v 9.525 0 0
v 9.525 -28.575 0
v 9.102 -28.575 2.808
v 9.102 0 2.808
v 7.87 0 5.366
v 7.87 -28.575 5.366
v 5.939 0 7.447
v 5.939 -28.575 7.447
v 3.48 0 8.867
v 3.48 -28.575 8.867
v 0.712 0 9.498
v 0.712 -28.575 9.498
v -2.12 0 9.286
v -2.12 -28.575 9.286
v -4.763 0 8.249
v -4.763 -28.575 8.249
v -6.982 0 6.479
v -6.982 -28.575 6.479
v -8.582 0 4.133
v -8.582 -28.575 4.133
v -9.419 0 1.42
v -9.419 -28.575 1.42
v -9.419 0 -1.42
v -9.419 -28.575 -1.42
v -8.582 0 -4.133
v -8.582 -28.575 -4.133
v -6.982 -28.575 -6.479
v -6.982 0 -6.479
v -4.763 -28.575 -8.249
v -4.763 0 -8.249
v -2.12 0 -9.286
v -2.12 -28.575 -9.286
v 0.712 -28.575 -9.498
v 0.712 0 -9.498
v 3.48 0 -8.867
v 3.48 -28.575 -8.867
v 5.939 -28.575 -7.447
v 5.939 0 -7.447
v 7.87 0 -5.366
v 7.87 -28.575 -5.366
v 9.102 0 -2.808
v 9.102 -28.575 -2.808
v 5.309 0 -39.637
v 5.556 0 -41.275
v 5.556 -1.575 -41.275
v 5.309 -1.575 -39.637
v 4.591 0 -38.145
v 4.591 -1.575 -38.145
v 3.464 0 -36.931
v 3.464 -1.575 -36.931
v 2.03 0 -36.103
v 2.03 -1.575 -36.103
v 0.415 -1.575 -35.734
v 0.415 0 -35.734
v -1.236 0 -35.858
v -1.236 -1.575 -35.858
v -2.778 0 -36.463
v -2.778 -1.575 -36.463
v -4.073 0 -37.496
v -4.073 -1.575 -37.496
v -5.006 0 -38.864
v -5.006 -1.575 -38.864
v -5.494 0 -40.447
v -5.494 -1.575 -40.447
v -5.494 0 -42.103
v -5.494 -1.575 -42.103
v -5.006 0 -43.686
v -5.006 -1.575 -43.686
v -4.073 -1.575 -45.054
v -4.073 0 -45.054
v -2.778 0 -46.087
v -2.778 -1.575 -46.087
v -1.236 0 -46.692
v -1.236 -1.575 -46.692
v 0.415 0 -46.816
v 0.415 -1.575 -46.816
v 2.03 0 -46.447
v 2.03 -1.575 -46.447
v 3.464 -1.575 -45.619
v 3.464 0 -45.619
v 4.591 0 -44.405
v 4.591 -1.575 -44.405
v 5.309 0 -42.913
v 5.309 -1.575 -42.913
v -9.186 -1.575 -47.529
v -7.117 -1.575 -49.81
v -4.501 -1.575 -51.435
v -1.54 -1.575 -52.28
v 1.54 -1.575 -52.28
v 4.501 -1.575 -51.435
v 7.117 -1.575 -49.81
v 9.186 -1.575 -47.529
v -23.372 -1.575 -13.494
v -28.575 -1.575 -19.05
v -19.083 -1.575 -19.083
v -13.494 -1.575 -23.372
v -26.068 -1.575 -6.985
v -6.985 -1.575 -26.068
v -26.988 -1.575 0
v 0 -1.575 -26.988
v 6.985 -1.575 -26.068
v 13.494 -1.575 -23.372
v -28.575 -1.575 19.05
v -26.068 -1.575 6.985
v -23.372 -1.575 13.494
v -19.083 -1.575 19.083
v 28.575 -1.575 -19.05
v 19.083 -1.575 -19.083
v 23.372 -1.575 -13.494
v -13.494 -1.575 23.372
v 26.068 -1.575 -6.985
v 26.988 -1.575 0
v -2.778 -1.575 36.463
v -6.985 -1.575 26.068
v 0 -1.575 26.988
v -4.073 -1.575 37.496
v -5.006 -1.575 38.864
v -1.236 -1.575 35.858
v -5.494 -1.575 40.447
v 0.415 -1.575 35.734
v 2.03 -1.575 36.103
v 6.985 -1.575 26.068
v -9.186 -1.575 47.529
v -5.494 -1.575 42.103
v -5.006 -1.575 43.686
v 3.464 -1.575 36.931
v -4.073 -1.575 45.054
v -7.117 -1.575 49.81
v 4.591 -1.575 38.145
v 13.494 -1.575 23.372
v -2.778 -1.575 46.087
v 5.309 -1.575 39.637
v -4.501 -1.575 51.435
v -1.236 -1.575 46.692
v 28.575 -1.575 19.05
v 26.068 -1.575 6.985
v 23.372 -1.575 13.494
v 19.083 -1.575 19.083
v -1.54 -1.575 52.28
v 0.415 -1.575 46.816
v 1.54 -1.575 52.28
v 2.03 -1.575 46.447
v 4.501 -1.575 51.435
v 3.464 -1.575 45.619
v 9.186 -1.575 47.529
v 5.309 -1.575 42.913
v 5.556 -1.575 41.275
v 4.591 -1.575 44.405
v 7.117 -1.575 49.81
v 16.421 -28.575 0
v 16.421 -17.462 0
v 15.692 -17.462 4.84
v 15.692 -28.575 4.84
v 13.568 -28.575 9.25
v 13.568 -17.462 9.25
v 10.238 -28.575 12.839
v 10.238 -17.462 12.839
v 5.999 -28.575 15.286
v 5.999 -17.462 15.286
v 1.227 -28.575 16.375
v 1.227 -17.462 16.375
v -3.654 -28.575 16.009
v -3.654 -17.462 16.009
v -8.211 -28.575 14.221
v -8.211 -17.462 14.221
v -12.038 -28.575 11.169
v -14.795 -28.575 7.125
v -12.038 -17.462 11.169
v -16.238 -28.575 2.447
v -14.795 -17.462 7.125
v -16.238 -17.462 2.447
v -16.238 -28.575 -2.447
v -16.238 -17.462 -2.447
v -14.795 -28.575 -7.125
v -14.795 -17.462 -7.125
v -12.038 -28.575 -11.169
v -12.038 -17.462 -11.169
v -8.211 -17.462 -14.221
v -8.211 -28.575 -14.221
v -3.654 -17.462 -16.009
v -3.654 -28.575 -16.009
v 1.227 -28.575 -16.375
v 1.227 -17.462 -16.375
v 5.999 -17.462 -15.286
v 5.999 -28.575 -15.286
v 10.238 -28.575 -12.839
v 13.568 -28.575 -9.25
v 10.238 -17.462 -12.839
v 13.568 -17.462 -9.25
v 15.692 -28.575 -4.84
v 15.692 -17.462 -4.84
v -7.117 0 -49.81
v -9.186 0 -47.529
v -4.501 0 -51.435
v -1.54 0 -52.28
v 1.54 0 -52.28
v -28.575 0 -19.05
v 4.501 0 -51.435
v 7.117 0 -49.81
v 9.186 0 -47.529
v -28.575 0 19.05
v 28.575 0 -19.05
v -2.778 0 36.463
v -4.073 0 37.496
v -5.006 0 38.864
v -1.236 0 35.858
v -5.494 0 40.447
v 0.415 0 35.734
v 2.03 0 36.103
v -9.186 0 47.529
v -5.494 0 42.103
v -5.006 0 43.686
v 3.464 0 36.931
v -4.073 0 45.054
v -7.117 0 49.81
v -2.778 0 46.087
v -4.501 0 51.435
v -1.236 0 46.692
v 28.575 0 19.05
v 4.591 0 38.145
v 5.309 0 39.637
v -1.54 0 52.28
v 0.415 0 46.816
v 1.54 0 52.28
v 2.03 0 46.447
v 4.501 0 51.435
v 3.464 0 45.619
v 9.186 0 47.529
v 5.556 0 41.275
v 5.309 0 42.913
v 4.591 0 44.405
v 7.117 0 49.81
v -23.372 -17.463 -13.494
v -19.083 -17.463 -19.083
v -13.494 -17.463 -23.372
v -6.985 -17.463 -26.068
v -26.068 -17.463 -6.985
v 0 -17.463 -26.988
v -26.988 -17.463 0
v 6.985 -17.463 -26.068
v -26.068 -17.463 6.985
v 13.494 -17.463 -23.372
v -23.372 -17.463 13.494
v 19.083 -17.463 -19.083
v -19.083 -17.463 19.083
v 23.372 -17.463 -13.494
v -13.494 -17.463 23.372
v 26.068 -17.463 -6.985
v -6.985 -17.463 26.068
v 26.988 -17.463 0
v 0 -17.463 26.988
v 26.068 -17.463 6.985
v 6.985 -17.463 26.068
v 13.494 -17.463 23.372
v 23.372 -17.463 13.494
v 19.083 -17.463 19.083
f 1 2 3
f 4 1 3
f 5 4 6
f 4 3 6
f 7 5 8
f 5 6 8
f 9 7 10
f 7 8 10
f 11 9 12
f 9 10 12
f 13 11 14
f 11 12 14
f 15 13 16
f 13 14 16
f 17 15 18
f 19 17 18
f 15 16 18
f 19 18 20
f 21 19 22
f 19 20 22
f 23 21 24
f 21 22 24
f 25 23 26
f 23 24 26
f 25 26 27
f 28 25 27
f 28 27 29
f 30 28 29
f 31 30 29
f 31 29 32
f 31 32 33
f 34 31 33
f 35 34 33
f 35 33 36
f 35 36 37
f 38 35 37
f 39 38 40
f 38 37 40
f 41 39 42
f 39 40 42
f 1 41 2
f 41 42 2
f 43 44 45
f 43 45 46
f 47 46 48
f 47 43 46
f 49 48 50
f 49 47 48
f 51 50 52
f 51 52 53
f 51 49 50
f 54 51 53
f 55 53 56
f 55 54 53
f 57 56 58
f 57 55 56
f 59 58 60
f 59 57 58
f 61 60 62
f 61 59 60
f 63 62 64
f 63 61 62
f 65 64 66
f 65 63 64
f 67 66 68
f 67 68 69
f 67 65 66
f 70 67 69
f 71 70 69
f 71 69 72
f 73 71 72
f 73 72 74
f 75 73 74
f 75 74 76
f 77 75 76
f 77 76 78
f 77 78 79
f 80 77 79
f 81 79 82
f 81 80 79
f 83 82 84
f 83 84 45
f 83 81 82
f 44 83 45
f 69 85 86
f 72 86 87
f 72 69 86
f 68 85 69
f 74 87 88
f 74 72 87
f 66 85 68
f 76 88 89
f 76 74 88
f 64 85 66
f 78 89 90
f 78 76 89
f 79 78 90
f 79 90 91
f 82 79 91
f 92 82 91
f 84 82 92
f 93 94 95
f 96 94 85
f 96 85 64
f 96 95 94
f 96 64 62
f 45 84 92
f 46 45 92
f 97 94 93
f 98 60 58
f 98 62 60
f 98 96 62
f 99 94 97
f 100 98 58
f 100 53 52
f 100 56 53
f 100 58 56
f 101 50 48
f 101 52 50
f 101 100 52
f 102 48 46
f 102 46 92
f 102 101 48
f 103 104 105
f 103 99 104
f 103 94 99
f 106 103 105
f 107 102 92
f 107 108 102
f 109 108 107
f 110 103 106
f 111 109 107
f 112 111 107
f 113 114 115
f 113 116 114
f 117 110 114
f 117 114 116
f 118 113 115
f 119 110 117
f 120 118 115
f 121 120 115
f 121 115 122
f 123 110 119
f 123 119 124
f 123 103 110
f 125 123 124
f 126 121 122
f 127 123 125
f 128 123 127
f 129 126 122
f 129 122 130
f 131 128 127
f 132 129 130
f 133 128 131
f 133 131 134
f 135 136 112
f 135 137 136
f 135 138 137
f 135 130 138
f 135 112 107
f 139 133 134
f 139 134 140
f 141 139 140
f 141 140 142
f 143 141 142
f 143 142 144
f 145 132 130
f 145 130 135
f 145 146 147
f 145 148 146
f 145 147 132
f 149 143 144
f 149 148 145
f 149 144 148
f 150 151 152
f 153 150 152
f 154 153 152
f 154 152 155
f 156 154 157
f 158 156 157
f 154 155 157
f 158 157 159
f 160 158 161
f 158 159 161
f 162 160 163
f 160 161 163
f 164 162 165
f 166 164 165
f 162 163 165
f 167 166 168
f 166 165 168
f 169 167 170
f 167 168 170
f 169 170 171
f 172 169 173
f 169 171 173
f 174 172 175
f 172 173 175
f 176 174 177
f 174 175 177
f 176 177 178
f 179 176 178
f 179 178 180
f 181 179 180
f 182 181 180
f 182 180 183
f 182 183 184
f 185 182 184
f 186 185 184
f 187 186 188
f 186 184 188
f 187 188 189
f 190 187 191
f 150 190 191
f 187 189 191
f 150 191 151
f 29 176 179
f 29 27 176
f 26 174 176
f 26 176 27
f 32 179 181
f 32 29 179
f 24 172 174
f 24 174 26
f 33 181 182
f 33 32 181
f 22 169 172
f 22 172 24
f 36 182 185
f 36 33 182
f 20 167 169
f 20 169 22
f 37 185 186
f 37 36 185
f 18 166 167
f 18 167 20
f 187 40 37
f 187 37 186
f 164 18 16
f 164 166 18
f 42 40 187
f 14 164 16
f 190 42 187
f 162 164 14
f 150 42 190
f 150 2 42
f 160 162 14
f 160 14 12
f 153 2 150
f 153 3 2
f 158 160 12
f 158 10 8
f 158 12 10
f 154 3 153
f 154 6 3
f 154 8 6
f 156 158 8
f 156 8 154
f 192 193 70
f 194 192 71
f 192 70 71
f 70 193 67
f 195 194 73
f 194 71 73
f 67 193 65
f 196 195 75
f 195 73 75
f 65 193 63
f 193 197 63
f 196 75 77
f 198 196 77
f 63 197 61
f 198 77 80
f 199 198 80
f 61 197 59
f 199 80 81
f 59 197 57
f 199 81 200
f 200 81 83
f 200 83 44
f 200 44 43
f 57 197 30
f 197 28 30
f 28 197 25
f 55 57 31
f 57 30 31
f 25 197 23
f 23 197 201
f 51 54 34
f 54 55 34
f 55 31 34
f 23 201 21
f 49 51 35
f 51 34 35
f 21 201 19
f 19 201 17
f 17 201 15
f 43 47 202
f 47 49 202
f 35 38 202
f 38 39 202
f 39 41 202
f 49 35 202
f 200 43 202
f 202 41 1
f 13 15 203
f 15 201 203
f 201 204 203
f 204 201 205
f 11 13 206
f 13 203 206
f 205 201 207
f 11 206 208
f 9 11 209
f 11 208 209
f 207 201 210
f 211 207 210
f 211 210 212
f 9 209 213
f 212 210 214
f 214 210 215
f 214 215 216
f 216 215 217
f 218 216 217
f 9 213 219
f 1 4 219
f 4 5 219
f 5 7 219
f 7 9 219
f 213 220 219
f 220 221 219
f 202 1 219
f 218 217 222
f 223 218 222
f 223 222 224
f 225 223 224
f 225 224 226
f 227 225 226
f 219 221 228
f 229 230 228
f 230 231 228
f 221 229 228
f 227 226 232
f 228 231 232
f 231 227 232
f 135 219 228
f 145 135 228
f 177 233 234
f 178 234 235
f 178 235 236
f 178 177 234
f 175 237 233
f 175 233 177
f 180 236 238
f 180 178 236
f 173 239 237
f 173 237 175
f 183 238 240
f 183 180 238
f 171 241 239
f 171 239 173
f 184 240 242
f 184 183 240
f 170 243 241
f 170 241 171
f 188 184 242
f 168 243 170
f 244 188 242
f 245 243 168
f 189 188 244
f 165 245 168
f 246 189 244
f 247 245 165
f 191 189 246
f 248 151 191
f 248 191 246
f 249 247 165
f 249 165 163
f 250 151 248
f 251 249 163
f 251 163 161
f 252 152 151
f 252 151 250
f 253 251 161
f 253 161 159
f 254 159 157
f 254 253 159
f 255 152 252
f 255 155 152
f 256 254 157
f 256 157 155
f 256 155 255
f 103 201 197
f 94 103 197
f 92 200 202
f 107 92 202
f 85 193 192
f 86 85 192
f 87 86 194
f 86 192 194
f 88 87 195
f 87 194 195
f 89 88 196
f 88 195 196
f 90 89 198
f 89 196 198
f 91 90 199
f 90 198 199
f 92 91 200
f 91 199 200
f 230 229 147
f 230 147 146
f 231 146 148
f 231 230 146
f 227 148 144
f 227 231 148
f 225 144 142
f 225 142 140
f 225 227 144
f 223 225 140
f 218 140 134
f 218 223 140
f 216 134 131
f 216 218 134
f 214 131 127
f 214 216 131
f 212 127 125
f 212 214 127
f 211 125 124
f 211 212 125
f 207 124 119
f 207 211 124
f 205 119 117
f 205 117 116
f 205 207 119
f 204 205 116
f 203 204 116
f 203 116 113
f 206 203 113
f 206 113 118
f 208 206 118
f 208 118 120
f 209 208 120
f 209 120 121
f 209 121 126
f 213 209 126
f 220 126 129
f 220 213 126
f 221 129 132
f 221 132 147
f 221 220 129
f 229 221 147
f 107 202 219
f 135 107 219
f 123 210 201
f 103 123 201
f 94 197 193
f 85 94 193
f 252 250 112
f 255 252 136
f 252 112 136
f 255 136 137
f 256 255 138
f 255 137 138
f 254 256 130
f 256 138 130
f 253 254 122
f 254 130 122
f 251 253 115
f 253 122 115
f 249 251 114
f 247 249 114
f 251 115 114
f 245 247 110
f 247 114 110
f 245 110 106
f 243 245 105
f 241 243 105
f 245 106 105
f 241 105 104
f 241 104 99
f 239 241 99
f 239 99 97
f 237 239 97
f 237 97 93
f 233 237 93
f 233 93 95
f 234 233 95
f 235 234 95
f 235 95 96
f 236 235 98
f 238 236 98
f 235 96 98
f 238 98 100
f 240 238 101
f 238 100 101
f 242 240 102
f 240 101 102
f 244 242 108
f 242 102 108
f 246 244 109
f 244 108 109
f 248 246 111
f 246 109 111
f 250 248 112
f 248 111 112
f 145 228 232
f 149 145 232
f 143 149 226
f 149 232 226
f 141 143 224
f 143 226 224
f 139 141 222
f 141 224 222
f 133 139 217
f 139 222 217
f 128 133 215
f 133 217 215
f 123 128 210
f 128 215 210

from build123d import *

# Parameters (mm, degrees)
F0_R     = 5.55625
F1_DEPTH = 1.5748
F2_R     = 26.9875
F3_DEPTH = 15.8877
F4_R     = 16.4211
F5_DEPTH = 11.1125
F6_R     = 9.525
F7_DEPTH = 28.575


with BuildPart() as f1:
    # F0 (on Front) → F1 (new body)
    with BuildSketch(Plane.XZ):
        with BuildLine():
            Line((28.575, 19.05), (9.185667, 47.528893))
            ThreePointArc((9.185667, 47.528893), (0, 52.3875), (-9.185667, 47.528893))
            Line((-9.185667, 47.528893), (-28.575, 19.05))
            Line((-28.575, 19.05), (-28.575, -19.05))
            Line((-28.575, -19.05), (-9.185667, -47.528893))
            ThreePointArc((-9.185667, -47.528893), (0, -52.3875), (9.185667, -47.528893))
            Line((9.185667, -47.528893), (28.575, -19.05))
            Line((28.575, -19.05), (28.575, 19.05))
        make_face()
        with Locations((0, -41.275)):
            Circle(F0_R, mode=Mode.SUBTRACT)
        with Locations((0, 41.275)):
            Circle(F0_R, mode=Mode.SUBTRACT)
    extrude(amount=F1_DEPTH)

    # F2 (on face) → F3 (join)
    with BuildSketch(Plane.XZ.offset(1.5748)):
        Circle(F2_R)
    extrude(amount=F3_DEPTH)

    # F4 (on face) → F5 (join)
    with BuildSketch(Plane.XZ.offset(17.4625)):
        Circle(F4_R)
    extrude(amount=F5_DEPTH)

    # F6 (on face) → F7 (cut, through all)
    with BuildSketch(Plane.XZ.offset(28.575)):
        Circle(F6_R)
    extrude(amount=-F7_DEPTH, mode=Mode.SUBTRACT)


solid = f1.part
